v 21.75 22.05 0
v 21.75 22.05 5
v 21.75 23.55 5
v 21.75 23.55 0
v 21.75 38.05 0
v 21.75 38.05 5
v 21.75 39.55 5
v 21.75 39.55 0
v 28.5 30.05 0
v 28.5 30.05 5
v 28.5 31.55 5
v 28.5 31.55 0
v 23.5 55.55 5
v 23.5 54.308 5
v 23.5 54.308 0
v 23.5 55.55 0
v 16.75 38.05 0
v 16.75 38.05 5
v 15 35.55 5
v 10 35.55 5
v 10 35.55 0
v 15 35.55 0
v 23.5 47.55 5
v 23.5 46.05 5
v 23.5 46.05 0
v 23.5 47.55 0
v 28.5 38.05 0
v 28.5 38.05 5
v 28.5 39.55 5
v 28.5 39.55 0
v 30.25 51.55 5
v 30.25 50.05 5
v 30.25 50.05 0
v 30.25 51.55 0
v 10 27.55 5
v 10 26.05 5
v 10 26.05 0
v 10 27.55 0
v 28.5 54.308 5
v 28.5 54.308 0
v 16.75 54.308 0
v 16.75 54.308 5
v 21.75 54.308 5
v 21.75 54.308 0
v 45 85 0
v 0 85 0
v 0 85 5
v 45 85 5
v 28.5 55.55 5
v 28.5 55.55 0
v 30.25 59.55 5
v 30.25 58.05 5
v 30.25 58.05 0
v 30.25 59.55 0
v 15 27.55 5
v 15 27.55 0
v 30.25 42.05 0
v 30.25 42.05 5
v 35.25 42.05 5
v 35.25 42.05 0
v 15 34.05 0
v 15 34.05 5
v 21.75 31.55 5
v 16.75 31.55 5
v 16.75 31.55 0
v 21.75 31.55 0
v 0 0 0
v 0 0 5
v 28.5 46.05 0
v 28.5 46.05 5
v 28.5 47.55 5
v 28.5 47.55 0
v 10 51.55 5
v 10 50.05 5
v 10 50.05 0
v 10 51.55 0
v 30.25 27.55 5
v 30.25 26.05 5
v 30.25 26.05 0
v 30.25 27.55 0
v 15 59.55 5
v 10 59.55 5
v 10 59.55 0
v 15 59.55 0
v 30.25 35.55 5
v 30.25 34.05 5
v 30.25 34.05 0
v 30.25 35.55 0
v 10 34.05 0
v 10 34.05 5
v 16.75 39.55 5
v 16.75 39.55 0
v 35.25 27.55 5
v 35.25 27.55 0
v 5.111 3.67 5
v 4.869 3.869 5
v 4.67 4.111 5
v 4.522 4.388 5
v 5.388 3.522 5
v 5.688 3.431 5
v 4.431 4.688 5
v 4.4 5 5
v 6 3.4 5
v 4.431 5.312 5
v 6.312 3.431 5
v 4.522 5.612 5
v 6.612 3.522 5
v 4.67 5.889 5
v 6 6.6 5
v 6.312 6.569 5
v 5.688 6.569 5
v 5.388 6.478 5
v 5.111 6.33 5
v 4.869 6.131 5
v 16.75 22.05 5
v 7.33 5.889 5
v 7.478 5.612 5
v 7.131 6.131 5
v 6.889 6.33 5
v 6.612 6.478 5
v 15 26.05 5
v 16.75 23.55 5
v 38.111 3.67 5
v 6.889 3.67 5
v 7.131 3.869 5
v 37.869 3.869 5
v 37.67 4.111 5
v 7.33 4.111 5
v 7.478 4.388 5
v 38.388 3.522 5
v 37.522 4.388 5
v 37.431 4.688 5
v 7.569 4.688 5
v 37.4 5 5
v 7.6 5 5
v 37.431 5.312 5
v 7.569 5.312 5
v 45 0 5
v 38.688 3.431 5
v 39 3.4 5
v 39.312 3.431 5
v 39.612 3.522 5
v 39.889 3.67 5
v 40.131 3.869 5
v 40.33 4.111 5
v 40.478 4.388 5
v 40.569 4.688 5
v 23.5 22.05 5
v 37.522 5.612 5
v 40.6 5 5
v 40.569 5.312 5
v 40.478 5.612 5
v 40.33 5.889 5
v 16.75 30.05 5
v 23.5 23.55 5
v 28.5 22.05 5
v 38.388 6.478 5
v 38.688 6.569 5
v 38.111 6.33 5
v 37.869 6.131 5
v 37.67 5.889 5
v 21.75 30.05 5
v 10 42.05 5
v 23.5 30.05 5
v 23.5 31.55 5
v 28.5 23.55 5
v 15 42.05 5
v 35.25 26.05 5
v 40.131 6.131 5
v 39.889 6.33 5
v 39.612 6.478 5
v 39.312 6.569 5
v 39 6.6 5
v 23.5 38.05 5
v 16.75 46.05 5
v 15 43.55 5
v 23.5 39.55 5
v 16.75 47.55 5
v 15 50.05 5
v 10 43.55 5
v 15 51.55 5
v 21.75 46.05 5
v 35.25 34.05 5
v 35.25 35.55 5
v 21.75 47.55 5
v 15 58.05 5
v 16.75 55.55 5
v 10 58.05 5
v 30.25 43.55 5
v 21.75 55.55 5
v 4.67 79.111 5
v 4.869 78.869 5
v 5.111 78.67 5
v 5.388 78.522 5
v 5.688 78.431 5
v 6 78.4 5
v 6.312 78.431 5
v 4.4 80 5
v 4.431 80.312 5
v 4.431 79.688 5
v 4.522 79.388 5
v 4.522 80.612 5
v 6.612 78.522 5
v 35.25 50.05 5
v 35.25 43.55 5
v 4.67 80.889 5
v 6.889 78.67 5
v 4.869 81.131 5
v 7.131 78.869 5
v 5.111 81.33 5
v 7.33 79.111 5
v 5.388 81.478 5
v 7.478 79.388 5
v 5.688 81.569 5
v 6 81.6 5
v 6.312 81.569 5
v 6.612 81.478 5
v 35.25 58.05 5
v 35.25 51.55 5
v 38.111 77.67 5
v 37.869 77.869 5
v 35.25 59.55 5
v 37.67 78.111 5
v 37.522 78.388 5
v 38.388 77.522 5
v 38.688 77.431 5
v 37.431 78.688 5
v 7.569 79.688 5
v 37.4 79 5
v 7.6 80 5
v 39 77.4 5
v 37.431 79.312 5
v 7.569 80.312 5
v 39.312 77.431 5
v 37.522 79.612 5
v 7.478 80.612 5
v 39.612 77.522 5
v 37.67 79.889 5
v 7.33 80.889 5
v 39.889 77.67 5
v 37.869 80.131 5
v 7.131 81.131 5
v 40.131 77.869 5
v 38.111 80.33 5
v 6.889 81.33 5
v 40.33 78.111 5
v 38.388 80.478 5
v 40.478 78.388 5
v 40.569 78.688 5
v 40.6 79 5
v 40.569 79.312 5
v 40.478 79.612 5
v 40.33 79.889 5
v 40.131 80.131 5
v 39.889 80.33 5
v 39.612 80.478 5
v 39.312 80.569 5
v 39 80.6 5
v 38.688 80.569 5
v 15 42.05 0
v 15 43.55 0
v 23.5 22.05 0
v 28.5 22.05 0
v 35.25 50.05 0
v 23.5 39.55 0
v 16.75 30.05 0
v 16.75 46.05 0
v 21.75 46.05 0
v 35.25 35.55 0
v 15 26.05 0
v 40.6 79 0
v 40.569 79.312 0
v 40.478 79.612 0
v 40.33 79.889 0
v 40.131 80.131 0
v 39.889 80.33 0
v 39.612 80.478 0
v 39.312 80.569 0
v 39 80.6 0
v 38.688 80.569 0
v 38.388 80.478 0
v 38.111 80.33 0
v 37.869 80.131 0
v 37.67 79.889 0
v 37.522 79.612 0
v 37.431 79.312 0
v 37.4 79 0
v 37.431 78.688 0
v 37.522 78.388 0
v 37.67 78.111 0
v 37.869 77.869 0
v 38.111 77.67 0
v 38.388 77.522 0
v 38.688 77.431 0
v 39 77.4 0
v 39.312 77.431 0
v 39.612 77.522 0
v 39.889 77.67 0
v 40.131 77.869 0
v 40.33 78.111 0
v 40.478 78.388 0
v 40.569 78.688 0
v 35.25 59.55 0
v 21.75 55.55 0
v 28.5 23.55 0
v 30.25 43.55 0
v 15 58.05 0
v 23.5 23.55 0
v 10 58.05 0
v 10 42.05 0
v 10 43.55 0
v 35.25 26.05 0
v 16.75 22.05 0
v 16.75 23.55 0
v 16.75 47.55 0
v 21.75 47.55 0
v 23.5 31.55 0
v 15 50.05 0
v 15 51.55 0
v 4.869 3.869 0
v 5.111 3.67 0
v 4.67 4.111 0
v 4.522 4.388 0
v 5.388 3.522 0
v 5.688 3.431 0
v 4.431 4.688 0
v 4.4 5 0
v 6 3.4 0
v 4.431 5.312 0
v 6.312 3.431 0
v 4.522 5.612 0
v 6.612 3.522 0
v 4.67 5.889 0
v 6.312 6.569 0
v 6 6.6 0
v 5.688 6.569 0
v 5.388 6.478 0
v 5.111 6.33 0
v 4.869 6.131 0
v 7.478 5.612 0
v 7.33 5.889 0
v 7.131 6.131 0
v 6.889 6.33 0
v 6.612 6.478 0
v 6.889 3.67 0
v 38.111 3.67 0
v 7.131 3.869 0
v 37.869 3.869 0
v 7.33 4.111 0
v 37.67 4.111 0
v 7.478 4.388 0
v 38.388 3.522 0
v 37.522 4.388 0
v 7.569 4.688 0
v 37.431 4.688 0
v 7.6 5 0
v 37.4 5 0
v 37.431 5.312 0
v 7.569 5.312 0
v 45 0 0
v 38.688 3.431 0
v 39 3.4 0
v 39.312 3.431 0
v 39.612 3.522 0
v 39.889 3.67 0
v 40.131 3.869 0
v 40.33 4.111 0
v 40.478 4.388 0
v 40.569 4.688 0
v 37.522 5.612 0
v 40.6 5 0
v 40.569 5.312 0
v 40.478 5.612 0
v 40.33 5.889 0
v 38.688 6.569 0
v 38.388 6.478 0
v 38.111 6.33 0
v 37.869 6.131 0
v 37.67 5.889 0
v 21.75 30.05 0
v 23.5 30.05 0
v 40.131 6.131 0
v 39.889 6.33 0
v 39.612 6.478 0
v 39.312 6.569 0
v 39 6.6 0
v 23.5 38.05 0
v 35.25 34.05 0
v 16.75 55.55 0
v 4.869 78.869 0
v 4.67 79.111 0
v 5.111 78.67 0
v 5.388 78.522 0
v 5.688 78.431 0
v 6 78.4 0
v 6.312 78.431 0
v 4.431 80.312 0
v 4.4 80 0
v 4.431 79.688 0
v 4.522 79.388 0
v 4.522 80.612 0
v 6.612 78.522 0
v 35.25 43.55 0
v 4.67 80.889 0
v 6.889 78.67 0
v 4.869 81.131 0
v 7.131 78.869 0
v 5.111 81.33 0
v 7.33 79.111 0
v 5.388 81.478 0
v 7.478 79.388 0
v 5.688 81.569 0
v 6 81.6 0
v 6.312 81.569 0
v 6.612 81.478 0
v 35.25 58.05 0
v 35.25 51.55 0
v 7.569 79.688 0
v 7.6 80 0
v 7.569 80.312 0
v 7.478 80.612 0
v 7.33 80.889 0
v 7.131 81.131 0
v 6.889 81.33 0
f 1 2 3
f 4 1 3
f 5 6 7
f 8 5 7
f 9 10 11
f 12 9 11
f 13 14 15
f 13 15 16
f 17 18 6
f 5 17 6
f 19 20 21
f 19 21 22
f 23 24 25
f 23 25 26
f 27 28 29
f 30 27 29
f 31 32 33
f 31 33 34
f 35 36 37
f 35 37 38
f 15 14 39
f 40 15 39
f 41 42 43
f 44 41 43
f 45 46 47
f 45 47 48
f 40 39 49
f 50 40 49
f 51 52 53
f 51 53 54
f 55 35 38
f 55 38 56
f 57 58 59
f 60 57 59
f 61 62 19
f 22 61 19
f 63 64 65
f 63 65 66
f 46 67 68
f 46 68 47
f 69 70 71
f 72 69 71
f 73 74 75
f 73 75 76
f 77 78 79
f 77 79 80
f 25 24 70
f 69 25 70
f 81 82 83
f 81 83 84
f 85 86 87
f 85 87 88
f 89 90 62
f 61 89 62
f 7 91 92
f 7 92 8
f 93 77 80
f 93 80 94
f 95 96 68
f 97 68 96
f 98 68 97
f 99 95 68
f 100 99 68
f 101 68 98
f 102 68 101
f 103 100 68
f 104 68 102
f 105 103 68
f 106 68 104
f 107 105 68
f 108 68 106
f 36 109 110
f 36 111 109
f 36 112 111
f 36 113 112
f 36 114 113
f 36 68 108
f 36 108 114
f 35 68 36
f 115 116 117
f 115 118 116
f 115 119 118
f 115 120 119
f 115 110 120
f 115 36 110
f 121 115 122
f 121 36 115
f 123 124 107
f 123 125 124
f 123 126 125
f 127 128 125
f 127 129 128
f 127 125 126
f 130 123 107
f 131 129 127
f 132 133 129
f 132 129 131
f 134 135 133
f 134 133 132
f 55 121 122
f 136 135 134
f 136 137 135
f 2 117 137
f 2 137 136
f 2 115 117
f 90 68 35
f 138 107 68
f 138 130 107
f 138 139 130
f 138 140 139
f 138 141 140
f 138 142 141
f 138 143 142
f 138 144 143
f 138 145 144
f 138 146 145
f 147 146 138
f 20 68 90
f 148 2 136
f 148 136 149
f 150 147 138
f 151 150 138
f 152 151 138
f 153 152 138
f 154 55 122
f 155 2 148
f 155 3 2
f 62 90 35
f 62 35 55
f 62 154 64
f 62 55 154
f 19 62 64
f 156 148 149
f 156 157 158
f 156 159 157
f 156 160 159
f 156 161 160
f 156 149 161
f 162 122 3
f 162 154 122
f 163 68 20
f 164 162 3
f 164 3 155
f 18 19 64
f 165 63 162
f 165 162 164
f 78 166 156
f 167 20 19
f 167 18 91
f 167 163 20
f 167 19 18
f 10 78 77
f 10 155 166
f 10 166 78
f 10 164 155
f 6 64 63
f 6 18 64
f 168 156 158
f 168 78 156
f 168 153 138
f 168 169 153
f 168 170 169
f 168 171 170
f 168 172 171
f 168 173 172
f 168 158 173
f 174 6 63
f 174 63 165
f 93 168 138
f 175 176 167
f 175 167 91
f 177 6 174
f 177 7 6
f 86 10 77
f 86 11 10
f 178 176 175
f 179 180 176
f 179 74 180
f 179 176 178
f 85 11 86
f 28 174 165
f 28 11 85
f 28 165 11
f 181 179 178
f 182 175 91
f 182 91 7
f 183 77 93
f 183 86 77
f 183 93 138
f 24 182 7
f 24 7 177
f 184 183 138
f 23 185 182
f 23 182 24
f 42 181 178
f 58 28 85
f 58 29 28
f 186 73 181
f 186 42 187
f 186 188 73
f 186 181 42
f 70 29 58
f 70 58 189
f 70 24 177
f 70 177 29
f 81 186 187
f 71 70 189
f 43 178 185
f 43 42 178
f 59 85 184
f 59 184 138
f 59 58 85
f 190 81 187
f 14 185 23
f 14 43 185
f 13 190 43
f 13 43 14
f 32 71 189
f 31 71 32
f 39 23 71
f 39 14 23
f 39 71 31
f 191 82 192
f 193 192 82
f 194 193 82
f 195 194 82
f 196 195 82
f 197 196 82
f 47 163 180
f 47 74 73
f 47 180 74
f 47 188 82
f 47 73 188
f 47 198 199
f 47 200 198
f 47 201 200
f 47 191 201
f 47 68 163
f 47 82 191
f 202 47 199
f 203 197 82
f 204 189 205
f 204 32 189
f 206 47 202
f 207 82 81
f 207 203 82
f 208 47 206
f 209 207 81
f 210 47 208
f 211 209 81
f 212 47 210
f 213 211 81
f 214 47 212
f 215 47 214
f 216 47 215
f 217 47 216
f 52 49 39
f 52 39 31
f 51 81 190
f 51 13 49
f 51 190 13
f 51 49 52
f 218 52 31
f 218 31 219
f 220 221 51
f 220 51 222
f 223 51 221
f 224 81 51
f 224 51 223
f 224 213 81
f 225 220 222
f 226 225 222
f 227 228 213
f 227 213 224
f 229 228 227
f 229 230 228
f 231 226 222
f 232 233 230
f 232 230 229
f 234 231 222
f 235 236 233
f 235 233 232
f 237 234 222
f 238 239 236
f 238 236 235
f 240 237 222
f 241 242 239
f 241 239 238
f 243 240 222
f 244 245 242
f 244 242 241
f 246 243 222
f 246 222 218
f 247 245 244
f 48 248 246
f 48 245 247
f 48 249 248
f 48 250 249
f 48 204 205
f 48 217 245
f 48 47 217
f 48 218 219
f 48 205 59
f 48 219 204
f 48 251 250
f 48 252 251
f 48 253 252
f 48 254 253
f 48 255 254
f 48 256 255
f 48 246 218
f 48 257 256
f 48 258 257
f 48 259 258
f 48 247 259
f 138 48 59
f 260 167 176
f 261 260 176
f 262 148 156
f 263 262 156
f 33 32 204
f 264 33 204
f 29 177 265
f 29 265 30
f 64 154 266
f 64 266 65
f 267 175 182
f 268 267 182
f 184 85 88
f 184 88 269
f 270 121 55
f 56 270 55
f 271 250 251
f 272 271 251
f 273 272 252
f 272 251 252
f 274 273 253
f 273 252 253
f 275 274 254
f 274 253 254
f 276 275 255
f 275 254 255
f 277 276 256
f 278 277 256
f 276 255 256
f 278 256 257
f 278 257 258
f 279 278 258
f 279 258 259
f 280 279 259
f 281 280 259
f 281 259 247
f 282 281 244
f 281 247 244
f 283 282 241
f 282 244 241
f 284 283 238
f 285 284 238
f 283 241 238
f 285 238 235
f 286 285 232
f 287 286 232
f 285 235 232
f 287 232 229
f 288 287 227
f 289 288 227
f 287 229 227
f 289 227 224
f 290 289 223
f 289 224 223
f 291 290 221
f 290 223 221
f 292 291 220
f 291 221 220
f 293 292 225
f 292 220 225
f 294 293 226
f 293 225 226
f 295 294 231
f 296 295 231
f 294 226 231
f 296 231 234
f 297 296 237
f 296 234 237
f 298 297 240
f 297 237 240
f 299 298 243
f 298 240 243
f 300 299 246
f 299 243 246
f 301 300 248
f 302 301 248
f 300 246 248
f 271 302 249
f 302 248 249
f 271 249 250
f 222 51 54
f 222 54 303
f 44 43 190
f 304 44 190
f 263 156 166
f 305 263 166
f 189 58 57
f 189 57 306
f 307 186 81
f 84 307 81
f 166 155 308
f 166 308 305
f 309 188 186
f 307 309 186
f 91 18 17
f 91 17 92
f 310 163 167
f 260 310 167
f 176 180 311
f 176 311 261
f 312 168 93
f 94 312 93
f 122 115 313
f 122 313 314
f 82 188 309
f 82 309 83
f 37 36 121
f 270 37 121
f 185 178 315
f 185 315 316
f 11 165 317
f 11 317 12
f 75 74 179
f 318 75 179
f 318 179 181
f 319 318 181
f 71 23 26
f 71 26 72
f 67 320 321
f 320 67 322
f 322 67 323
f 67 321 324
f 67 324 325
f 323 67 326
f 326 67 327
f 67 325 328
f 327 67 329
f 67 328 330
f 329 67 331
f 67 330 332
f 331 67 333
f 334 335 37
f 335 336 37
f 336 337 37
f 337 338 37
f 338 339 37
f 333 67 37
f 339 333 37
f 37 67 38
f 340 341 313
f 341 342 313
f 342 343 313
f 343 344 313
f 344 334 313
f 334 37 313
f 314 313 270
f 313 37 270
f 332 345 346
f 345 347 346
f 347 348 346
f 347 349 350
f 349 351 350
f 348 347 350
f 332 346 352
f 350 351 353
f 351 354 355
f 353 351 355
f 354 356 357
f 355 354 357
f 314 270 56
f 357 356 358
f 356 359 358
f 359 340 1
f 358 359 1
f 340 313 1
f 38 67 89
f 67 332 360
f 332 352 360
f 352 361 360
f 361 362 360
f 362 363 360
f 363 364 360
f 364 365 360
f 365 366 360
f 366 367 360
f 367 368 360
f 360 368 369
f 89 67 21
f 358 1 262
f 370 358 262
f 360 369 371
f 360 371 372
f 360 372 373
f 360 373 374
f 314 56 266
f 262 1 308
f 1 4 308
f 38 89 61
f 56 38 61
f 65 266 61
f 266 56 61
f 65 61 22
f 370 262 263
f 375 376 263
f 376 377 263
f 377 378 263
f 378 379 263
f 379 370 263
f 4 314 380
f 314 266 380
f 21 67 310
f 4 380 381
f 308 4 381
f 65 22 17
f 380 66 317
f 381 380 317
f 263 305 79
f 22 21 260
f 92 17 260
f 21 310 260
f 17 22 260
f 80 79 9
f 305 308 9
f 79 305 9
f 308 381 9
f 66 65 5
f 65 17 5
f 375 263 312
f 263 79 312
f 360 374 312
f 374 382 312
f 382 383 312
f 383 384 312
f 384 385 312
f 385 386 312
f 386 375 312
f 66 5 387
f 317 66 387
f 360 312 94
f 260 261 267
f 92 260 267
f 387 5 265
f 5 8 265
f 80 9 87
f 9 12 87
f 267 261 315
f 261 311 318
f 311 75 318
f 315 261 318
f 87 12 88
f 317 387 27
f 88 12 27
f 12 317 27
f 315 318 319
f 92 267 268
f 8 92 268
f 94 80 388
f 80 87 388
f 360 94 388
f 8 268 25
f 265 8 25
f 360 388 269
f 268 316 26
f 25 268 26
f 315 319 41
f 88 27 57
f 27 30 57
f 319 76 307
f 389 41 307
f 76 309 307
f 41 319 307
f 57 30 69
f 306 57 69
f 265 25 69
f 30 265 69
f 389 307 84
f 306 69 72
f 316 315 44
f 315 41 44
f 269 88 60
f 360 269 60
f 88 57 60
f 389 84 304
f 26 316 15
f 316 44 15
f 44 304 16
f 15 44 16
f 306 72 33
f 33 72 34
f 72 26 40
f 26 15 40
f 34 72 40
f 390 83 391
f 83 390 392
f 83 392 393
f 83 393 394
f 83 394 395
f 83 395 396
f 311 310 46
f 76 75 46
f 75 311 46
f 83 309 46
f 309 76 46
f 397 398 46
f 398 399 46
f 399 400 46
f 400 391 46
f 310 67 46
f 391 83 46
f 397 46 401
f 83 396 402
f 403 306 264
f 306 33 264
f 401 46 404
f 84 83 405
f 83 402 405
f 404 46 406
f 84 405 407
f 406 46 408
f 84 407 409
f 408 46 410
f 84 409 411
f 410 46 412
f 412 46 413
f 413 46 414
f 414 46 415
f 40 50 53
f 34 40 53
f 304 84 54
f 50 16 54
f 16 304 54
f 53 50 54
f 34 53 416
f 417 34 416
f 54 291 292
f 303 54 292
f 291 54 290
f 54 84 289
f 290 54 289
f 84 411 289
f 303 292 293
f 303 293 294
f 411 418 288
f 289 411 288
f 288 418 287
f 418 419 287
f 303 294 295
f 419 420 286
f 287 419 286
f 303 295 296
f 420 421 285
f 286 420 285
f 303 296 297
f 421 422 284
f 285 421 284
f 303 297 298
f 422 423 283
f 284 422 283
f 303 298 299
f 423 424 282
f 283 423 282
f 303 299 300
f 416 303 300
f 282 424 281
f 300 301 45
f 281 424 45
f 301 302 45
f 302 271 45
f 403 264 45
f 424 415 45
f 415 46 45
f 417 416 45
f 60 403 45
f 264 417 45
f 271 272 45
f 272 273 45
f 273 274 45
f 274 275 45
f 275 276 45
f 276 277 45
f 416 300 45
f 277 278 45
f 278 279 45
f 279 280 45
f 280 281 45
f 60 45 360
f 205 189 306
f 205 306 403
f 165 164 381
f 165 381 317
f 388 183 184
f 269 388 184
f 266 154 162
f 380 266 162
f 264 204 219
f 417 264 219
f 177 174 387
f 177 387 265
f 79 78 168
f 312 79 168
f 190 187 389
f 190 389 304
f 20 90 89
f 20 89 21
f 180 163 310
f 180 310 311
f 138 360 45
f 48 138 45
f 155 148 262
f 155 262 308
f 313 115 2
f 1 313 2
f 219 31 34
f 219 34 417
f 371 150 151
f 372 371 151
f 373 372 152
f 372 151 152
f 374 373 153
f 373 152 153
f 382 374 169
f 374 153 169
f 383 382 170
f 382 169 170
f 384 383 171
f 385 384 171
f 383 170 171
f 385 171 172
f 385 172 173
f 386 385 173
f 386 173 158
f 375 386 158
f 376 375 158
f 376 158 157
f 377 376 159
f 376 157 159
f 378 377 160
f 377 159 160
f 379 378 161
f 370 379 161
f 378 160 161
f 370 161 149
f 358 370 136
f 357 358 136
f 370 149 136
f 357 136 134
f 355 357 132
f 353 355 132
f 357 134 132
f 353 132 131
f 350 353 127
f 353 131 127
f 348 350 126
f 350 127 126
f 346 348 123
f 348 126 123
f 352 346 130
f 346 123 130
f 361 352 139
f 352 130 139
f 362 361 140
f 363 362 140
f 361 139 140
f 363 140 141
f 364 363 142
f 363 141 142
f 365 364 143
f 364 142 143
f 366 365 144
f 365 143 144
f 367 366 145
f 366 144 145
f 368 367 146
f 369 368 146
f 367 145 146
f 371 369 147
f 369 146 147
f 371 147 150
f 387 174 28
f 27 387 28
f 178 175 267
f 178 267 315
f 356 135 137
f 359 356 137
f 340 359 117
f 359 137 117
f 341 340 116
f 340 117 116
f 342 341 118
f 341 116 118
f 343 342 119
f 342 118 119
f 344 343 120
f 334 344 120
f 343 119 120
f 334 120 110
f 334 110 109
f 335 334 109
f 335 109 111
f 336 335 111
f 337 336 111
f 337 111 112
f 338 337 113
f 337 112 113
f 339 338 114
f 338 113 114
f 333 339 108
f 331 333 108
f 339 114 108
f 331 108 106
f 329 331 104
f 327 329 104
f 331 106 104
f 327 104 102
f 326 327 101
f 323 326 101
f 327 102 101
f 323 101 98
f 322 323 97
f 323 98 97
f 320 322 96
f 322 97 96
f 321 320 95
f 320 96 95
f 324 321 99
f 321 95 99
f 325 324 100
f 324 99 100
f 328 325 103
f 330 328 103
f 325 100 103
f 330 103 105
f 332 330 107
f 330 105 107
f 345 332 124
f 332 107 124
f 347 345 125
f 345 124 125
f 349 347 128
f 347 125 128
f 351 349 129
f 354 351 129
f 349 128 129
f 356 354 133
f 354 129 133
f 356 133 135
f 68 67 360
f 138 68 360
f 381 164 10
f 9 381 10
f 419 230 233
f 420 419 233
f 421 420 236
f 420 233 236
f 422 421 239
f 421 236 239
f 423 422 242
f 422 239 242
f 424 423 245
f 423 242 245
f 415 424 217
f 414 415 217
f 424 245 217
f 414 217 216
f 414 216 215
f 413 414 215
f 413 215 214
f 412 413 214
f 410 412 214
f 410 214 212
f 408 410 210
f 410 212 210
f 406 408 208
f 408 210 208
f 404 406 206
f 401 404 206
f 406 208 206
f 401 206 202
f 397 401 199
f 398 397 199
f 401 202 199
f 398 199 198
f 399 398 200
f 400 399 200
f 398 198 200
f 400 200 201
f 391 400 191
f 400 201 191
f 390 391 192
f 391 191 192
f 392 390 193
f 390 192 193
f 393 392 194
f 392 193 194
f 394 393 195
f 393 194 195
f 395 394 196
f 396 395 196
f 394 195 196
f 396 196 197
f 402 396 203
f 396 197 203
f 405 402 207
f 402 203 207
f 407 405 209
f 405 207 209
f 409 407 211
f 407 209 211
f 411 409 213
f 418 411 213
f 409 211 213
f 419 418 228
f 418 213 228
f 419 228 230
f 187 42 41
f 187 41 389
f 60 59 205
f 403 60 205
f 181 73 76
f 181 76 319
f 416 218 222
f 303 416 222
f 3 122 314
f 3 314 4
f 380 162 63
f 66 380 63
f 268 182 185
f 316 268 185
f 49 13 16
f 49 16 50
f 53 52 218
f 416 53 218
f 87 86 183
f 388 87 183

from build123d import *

# Parameters (mm, degrees)
SKIZZE1_W                       = 45
SKIZZE1_H                       = 85
AUFSATZ_LINEAR_AUSTRAGEN1_DEPTH = 5
SKIZZE3_W                       = 5
SKIZZE3_H                       = 1.5
SKIZZE3_H_2                     = 1.241942413
SCHNITT_LINEAR_AUSTRAGEN1_DEPTH = 5
SKIZZE4_R                       = 1.6
SCHNITT_LINEAR_AUSTRAGEN2_DEPTH = 5


with BuildPart() as part:
    # Skizze1 → Aufsatz-Linear austragen1 (new body)
    with BuildSketch(Plane.XY):
        with Locations((22.5, 42.5)):
            Rectangle(SKIZZE1_W, SKIZZE1_H)
    extrude(amount=AUFSATZ_LINEAR_AUSTRAGEN1_DEPTH)

    # Skizze3 → Schnitt-Linear austragen1 (cut)
    with BuildSketch(Plane.XY.offset(5)):
        with Locations((12.5, 58.8)):
            Rectangle(SKIZZE3_W, SKIZZE3_H)
        with Locations((32.75, 58.8)):
            Rectangle(SKIZZE3_W, SKIZZE3_H)
        with Locations((19.25, 46.8)):
            Rectangle(SKIZZE3_W, SKIZZE3_H)
        with Locations((12.5, 50.8)):
            Rectangle(SKIZZE3_W, SKIZZE3_H)
        with Locations((32.75, 50.8)):
            Rectangle(SKIZZE3_W, SKIZZE3_H)
        with Locations((12.5, 42.8)):
            Rectangle(SKIZZE3_W, SKIZZE3_H)
        with Locations((32.75, 42.8)):
            Rectangle(SKIZZE3_W, SKIZZE3_H)
        with Locations((12.5, 34.8)):
            Rectangle(SKIZZE3_W, SKIZZE3_H)
        with Locations((32.75, 34.8)):
            Rectangle(SKIZZE3_W, SKIZZE3_H)
        with Locations((32.75, 26.8)):
            Rectangle(SKIZZE3_W, SKIZZE3_H)
        with Locations((12.5, 26.8)):
            Rectangle(SKIZZE3_W, SKIZZE3_H)
        with Locations((19.25, 54.929028794)):
            Rectangle(SKIZZE3_W, SKIZZE3_H_2)
        with Locations((26, 54.929028794)):
            Rectangle(SKIZZE3_W, SKIZZE3_H_2)
        with Locations((26, 46.8)):
            Rectangle(SKIZZE3_W, SKIZZE3_H)
        with Locations((26, 38.8)):
            Rectangle(SKIZZE3_W, SKIZZE3_H)
        with Locations((19.25, 38.8)):
            Rectangle(SKIZZE3_W, SKIZZE3_H)
        with Locations((19.25, 30.8)):
            Rectangle(SKIZZE3_W, SKIZZE3_H)
        with Locations((26, 30.8)):
            Rectangle(SKIZZE3_W, SKIZZE3_H)
        with Locations((26, 22.8)):
            Rectangle(SKIZZE3_W, SKIZZE3_H)
        with Locations((19.25, 22.8)):
            Rectangle(SKIZZE3_W, SKIZZE3_H)
    extrude(amount=-SCHNITT_LINEAR_AUSTRAGEN1_DEPTH, mode=Mode.SUBTRACT)

    # Skizze4 → Schnitt-Linear austragen2 (cut)
    with BuildSketch(Plane.XY.offset(5)):
        with Locations((6, 80)):
            Circle(SKIZZE4_R)
        with Locations((39, 79)):
            Circle(SKIZZE4_R)
        with Locations((39, 5)):
            Circle(SKIZZE4_R)
        with Locations((6, 5)):
            Circle(SKIZZE4_R)
    extrude(amount=-SCHNITT_LINEAR_AUSTRAGEN2_DEPTH, mode=Mode.SUBTRACT)


solid = part.part
